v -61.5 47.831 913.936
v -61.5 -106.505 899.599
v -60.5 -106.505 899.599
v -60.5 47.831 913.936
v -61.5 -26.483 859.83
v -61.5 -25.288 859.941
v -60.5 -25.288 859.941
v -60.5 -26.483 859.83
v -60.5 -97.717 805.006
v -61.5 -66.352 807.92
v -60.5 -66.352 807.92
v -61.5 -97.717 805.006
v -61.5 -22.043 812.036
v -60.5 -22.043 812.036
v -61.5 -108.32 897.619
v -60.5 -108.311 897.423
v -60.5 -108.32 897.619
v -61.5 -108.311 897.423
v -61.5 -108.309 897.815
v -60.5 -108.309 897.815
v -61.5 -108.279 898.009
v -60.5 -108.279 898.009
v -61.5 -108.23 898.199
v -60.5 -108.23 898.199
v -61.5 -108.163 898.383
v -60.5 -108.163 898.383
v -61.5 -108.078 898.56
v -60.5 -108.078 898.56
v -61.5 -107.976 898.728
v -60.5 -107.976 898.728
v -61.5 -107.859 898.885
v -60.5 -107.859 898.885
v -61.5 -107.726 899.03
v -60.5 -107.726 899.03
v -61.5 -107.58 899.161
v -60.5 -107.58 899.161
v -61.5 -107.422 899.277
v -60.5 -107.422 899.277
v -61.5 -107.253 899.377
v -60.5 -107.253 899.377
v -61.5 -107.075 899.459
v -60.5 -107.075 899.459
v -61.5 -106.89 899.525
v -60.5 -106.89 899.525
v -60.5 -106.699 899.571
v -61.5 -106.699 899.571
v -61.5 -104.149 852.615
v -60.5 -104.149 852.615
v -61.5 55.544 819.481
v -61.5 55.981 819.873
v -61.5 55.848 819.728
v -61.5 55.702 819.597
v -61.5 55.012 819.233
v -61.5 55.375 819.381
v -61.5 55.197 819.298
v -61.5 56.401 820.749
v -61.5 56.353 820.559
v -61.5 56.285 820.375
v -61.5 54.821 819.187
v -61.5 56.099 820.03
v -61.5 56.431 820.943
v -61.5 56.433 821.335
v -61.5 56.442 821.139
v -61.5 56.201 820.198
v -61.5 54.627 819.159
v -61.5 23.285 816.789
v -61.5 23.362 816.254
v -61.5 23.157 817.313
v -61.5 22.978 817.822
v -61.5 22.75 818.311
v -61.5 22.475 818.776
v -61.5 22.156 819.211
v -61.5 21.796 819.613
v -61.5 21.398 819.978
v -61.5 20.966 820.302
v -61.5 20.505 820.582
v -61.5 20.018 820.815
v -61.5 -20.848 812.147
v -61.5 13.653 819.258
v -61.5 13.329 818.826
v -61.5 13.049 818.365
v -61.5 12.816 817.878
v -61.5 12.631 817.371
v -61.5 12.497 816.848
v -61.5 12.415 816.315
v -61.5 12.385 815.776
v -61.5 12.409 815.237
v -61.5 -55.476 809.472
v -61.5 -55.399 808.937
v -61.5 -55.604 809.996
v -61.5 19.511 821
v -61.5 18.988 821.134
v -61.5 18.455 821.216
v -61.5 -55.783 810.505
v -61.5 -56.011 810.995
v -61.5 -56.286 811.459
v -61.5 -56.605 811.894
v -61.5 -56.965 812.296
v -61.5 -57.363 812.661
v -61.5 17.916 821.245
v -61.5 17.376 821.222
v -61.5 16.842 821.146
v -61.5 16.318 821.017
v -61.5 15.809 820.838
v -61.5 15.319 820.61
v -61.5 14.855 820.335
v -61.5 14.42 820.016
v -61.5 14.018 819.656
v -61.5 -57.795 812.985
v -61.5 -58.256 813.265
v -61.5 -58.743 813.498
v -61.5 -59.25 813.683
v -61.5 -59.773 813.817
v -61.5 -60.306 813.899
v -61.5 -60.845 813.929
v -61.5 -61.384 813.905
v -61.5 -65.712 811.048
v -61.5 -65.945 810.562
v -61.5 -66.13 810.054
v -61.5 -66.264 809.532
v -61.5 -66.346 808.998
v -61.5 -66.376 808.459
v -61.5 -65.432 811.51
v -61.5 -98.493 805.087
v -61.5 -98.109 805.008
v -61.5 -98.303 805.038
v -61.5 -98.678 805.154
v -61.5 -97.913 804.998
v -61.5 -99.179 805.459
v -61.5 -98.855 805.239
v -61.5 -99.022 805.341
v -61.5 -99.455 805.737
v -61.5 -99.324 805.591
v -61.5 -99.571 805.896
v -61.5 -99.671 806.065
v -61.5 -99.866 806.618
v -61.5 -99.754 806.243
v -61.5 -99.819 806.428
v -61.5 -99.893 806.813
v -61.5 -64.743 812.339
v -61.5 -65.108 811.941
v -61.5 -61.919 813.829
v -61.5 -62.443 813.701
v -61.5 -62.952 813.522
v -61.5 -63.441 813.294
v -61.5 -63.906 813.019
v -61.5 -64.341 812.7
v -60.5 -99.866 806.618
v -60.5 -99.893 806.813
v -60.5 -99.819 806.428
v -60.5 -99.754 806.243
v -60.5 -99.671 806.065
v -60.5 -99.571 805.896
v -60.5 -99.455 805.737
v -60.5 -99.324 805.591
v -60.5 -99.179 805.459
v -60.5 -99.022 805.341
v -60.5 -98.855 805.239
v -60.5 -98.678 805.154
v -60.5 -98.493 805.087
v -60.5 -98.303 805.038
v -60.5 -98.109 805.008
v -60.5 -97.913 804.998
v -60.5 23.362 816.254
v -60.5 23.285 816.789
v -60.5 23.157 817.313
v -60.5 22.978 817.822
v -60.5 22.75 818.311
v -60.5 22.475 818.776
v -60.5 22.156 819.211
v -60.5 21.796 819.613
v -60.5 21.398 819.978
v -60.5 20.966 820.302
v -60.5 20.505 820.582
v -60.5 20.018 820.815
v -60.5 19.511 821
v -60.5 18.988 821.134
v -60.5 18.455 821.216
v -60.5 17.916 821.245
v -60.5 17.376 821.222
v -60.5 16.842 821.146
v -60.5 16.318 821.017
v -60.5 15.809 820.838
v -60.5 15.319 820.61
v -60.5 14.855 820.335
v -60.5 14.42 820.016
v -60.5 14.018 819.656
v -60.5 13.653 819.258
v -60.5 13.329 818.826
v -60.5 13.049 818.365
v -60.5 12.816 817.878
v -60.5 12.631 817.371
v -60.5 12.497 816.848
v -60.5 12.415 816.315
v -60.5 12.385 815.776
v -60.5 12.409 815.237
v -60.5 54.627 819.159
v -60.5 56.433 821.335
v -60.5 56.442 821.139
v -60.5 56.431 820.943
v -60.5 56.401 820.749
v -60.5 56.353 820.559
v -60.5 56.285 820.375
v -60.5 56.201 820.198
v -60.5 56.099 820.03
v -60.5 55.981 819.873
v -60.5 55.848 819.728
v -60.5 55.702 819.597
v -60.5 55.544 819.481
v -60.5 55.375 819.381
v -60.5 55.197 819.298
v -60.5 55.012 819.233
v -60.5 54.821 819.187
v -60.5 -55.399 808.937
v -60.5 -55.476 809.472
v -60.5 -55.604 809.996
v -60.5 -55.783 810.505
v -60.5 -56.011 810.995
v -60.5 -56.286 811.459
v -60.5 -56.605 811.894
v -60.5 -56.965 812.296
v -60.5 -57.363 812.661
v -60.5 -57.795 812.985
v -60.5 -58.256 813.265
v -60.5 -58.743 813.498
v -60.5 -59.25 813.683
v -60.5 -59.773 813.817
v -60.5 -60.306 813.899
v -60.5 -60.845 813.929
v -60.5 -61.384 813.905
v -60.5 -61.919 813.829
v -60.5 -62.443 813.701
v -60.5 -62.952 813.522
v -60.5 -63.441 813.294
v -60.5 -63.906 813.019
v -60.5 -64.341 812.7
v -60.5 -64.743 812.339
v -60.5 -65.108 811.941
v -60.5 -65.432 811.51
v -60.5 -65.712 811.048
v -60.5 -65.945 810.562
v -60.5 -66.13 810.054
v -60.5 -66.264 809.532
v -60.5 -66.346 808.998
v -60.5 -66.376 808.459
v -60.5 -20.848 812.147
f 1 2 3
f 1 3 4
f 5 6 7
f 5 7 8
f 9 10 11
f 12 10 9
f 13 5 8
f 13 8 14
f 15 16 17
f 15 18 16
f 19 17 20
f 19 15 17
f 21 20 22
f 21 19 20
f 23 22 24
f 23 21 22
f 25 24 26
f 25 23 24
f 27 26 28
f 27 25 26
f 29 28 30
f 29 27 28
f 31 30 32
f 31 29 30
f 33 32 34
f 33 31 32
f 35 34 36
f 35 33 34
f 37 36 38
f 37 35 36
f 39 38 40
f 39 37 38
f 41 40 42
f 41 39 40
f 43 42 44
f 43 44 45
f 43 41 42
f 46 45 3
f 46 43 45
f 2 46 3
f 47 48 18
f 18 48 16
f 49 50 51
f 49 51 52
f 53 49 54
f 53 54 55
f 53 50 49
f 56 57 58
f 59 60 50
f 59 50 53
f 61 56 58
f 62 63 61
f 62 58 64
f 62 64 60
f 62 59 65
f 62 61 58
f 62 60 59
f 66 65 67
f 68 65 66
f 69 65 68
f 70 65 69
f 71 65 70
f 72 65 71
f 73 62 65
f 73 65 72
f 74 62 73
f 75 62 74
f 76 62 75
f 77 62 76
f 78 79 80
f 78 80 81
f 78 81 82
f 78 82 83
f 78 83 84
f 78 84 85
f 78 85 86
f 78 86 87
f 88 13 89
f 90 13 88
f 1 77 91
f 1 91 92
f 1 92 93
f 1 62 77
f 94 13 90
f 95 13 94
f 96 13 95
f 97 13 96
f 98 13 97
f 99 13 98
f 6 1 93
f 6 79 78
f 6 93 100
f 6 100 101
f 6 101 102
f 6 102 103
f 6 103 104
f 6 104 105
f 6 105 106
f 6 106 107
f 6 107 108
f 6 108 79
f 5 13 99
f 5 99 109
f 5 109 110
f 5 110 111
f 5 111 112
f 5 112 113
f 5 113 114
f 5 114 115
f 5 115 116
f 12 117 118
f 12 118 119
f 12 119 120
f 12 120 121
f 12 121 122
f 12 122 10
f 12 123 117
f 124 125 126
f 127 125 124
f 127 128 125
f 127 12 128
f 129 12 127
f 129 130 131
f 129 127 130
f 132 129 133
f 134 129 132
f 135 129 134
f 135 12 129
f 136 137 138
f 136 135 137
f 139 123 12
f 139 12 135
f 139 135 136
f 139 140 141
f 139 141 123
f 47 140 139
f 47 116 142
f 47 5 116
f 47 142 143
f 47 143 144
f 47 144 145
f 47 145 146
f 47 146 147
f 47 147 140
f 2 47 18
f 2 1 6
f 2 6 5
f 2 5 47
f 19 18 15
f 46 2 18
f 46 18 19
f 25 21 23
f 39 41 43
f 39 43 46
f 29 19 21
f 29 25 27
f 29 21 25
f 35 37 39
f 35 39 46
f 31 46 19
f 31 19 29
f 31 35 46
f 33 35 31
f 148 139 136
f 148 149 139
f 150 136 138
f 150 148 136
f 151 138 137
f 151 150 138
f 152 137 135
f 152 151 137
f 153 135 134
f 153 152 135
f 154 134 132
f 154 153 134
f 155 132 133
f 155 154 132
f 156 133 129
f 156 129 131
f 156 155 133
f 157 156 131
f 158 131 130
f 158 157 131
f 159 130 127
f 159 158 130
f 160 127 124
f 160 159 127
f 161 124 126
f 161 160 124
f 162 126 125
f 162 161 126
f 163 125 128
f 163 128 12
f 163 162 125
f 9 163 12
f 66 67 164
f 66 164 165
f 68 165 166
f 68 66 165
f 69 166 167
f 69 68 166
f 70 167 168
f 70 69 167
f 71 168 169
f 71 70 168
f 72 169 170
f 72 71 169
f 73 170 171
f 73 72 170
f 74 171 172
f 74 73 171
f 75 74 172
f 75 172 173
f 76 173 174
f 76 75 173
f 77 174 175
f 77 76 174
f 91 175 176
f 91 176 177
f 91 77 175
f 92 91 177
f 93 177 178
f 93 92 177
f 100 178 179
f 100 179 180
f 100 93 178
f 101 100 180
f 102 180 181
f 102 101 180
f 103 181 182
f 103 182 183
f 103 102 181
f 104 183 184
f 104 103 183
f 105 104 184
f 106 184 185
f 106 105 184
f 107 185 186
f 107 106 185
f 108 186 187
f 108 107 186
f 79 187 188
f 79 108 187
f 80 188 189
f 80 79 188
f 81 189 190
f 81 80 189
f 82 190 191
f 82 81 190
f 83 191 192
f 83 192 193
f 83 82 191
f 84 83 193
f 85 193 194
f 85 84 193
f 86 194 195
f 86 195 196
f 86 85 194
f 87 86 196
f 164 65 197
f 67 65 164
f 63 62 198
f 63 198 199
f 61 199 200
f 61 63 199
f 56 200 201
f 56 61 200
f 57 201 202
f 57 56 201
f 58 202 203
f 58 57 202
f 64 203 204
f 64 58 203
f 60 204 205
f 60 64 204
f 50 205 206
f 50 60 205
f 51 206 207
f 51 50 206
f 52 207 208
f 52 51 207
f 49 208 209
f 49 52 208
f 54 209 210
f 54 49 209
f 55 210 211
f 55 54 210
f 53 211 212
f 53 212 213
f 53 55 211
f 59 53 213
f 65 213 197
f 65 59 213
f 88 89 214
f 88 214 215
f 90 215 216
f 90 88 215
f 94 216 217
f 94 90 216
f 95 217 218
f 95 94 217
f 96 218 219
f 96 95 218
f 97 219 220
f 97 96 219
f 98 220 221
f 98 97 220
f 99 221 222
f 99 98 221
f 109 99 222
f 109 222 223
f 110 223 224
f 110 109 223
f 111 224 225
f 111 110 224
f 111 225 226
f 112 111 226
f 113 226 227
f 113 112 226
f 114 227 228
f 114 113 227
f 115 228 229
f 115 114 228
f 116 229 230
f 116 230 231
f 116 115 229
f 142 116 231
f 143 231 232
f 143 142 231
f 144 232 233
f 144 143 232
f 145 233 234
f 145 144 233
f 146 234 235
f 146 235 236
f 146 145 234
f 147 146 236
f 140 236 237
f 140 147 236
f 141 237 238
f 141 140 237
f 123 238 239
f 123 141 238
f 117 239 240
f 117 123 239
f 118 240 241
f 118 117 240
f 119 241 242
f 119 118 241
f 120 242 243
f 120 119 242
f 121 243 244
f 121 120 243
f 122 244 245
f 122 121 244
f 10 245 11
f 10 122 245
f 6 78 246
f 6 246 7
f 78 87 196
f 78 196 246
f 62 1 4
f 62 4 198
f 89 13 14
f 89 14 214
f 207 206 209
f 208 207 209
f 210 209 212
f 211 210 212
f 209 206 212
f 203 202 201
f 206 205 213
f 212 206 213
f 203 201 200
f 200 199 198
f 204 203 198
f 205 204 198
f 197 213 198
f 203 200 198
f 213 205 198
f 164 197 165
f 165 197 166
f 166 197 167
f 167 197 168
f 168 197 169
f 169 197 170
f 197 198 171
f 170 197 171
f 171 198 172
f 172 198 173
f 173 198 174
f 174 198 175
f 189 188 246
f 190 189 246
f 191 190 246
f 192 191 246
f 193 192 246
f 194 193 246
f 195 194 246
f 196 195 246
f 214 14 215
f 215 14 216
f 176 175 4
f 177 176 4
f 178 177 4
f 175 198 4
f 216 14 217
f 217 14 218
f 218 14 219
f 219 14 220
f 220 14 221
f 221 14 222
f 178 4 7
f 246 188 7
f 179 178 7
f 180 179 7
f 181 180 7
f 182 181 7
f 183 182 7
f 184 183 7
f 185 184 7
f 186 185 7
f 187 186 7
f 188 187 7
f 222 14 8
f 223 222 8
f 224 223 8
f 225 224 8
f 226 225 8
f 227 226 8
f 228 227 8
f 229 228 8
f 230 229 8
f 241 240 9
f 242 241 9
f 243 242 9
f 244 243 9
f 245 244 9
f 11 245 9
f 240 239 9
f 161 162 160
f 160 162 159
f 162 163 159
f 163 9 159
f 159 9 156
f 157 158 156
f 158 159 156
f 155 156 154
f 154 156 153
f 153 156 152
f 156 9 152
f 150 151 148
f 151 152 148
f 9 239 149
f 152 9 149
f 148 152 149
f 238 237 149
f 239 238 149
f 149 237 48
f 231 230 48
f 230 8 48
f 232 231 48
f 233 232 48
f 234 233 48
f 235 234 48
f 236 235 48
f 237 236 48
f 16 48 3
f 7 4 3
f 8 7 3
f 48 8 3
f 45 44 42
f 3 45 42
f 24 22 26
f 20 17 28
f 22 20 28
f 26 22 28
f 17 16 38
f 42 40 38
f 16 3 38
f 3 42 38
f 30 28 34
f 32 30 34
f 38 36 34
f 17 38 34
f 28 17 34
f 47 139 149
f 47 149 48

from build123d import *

# Parameters (mm, degrees)
EXTRUDE_1_DEPTH     = 1
CUT_EXTRUDE_1_DEPTH = 10
FILLET_1_R          = 2
FILLET_2_R          = 2


with BuildPart() as part:
    # 草图1 → 凸台-拉伸1 (new body)
    with BuildSketch(Plane(origin=(-61.5, 0, 0), x_dir=(0, -1, 0), z_dir=(-1, 0, 0))):
        with BuildLine():
            Line((145.112990447, 800.603209432), (176.378367534, 797.698696456))
            ThreePointArc((176.378367534, 797.698696456), (177.840703349, 798.15115608), (178.554793652, 799.505120921))
            Line((178.554793652, 799.505120921), (187.157332086, 892.106397006))
            Line((187.157332086, 892.106397006), (-47.830852387, 913.936494537))
            Line((-47.830852387, 913.936494537), (-56.433390821, 821.335218452))
            ThreePointArc((-56.433390821, 821.335218452), (-55.980931196, 819.872882636), (-54.626966355, 819.158792334))
            Line((-54.626966355, 819.158792334), (-23.361589268, 816.254279357))
            ThreePointArc((-23.361589268, 816.254279357), (-17.376417442, 821.221946637), (-12.408750162, 815.236774811))
            Line((-12.408750162, 815.236774811), (20.848052217, 812.147261008))
            Line((20.848052217, 812.147261008), (25.288072054, 859.941468019))
            Line((25.288072054, 859.941468019), (26.482927229, 859.830467523))
            Line((26.482927229, 859.830467523), (22.042907393, 812.036260512))
            Line((22.042907393, 812.036260512), (55.399281036, 808.937496668))
            ThreePointArc((55.399281036, 808.937496668), (61.384452862, 813.905163948), (66.352120143, 807.919992122))
            Line((66.352120143, 807.919992122), (99.708493786, 804.821228277))
            Line((99.708493786, 804.821228277), (104.148513623, 852.615435289))
            Line((104.148513623, 852.615435289), (105.343368798, 852.504434793))
            Line((105.343368798, 852.504434793), (100.903348961, 804.710227781))
            Line((100.903348961, 804.710227781), (134.16015134, 801.620713978))
            ThreePointArc((134.16015134, 801.620713978), (140.145323166, 806.588381259), (145.112990447, 800.603209432))
        make_face()
    extrude(amount=-EXTRUDE_1_DEPTH)

    # 草图2 → 切除-拉伸1 (cut)
    with BuildSketch(Plane(origin=(-60.5, 0, 0), x_dir=(0, 0, -1), z_dir=(1, 0, 0))):
        Polygon((-804.821228277, -99.708493786), (-899.413929654, -108.496033046), (-892.106397006, -187.157332086), (-797.513695629, -178.369792826), align=None)
    extrude(amount=-CUT_EXTRUDE_1_DEPTH, mode=Mode.SUBTRACT)

    # 圆角1
    fillet_1_edges = [part.edges().sort_by_distance(p)[0] for p in [
        (-61, -108.496033046, 899.413929654),
    ]]
    fillet(fillet_1_edges, radius=FILLET_1_R)

    # 圆角2
    fillet_2_edges = [part.edges().sort_by_distance(p)[0] for p in [
        (-61, -99.708493786, 804.821228277),
    ]]
    fillet(fillet_2_edges, radius=FILLET_2_R)


solid = part.part
